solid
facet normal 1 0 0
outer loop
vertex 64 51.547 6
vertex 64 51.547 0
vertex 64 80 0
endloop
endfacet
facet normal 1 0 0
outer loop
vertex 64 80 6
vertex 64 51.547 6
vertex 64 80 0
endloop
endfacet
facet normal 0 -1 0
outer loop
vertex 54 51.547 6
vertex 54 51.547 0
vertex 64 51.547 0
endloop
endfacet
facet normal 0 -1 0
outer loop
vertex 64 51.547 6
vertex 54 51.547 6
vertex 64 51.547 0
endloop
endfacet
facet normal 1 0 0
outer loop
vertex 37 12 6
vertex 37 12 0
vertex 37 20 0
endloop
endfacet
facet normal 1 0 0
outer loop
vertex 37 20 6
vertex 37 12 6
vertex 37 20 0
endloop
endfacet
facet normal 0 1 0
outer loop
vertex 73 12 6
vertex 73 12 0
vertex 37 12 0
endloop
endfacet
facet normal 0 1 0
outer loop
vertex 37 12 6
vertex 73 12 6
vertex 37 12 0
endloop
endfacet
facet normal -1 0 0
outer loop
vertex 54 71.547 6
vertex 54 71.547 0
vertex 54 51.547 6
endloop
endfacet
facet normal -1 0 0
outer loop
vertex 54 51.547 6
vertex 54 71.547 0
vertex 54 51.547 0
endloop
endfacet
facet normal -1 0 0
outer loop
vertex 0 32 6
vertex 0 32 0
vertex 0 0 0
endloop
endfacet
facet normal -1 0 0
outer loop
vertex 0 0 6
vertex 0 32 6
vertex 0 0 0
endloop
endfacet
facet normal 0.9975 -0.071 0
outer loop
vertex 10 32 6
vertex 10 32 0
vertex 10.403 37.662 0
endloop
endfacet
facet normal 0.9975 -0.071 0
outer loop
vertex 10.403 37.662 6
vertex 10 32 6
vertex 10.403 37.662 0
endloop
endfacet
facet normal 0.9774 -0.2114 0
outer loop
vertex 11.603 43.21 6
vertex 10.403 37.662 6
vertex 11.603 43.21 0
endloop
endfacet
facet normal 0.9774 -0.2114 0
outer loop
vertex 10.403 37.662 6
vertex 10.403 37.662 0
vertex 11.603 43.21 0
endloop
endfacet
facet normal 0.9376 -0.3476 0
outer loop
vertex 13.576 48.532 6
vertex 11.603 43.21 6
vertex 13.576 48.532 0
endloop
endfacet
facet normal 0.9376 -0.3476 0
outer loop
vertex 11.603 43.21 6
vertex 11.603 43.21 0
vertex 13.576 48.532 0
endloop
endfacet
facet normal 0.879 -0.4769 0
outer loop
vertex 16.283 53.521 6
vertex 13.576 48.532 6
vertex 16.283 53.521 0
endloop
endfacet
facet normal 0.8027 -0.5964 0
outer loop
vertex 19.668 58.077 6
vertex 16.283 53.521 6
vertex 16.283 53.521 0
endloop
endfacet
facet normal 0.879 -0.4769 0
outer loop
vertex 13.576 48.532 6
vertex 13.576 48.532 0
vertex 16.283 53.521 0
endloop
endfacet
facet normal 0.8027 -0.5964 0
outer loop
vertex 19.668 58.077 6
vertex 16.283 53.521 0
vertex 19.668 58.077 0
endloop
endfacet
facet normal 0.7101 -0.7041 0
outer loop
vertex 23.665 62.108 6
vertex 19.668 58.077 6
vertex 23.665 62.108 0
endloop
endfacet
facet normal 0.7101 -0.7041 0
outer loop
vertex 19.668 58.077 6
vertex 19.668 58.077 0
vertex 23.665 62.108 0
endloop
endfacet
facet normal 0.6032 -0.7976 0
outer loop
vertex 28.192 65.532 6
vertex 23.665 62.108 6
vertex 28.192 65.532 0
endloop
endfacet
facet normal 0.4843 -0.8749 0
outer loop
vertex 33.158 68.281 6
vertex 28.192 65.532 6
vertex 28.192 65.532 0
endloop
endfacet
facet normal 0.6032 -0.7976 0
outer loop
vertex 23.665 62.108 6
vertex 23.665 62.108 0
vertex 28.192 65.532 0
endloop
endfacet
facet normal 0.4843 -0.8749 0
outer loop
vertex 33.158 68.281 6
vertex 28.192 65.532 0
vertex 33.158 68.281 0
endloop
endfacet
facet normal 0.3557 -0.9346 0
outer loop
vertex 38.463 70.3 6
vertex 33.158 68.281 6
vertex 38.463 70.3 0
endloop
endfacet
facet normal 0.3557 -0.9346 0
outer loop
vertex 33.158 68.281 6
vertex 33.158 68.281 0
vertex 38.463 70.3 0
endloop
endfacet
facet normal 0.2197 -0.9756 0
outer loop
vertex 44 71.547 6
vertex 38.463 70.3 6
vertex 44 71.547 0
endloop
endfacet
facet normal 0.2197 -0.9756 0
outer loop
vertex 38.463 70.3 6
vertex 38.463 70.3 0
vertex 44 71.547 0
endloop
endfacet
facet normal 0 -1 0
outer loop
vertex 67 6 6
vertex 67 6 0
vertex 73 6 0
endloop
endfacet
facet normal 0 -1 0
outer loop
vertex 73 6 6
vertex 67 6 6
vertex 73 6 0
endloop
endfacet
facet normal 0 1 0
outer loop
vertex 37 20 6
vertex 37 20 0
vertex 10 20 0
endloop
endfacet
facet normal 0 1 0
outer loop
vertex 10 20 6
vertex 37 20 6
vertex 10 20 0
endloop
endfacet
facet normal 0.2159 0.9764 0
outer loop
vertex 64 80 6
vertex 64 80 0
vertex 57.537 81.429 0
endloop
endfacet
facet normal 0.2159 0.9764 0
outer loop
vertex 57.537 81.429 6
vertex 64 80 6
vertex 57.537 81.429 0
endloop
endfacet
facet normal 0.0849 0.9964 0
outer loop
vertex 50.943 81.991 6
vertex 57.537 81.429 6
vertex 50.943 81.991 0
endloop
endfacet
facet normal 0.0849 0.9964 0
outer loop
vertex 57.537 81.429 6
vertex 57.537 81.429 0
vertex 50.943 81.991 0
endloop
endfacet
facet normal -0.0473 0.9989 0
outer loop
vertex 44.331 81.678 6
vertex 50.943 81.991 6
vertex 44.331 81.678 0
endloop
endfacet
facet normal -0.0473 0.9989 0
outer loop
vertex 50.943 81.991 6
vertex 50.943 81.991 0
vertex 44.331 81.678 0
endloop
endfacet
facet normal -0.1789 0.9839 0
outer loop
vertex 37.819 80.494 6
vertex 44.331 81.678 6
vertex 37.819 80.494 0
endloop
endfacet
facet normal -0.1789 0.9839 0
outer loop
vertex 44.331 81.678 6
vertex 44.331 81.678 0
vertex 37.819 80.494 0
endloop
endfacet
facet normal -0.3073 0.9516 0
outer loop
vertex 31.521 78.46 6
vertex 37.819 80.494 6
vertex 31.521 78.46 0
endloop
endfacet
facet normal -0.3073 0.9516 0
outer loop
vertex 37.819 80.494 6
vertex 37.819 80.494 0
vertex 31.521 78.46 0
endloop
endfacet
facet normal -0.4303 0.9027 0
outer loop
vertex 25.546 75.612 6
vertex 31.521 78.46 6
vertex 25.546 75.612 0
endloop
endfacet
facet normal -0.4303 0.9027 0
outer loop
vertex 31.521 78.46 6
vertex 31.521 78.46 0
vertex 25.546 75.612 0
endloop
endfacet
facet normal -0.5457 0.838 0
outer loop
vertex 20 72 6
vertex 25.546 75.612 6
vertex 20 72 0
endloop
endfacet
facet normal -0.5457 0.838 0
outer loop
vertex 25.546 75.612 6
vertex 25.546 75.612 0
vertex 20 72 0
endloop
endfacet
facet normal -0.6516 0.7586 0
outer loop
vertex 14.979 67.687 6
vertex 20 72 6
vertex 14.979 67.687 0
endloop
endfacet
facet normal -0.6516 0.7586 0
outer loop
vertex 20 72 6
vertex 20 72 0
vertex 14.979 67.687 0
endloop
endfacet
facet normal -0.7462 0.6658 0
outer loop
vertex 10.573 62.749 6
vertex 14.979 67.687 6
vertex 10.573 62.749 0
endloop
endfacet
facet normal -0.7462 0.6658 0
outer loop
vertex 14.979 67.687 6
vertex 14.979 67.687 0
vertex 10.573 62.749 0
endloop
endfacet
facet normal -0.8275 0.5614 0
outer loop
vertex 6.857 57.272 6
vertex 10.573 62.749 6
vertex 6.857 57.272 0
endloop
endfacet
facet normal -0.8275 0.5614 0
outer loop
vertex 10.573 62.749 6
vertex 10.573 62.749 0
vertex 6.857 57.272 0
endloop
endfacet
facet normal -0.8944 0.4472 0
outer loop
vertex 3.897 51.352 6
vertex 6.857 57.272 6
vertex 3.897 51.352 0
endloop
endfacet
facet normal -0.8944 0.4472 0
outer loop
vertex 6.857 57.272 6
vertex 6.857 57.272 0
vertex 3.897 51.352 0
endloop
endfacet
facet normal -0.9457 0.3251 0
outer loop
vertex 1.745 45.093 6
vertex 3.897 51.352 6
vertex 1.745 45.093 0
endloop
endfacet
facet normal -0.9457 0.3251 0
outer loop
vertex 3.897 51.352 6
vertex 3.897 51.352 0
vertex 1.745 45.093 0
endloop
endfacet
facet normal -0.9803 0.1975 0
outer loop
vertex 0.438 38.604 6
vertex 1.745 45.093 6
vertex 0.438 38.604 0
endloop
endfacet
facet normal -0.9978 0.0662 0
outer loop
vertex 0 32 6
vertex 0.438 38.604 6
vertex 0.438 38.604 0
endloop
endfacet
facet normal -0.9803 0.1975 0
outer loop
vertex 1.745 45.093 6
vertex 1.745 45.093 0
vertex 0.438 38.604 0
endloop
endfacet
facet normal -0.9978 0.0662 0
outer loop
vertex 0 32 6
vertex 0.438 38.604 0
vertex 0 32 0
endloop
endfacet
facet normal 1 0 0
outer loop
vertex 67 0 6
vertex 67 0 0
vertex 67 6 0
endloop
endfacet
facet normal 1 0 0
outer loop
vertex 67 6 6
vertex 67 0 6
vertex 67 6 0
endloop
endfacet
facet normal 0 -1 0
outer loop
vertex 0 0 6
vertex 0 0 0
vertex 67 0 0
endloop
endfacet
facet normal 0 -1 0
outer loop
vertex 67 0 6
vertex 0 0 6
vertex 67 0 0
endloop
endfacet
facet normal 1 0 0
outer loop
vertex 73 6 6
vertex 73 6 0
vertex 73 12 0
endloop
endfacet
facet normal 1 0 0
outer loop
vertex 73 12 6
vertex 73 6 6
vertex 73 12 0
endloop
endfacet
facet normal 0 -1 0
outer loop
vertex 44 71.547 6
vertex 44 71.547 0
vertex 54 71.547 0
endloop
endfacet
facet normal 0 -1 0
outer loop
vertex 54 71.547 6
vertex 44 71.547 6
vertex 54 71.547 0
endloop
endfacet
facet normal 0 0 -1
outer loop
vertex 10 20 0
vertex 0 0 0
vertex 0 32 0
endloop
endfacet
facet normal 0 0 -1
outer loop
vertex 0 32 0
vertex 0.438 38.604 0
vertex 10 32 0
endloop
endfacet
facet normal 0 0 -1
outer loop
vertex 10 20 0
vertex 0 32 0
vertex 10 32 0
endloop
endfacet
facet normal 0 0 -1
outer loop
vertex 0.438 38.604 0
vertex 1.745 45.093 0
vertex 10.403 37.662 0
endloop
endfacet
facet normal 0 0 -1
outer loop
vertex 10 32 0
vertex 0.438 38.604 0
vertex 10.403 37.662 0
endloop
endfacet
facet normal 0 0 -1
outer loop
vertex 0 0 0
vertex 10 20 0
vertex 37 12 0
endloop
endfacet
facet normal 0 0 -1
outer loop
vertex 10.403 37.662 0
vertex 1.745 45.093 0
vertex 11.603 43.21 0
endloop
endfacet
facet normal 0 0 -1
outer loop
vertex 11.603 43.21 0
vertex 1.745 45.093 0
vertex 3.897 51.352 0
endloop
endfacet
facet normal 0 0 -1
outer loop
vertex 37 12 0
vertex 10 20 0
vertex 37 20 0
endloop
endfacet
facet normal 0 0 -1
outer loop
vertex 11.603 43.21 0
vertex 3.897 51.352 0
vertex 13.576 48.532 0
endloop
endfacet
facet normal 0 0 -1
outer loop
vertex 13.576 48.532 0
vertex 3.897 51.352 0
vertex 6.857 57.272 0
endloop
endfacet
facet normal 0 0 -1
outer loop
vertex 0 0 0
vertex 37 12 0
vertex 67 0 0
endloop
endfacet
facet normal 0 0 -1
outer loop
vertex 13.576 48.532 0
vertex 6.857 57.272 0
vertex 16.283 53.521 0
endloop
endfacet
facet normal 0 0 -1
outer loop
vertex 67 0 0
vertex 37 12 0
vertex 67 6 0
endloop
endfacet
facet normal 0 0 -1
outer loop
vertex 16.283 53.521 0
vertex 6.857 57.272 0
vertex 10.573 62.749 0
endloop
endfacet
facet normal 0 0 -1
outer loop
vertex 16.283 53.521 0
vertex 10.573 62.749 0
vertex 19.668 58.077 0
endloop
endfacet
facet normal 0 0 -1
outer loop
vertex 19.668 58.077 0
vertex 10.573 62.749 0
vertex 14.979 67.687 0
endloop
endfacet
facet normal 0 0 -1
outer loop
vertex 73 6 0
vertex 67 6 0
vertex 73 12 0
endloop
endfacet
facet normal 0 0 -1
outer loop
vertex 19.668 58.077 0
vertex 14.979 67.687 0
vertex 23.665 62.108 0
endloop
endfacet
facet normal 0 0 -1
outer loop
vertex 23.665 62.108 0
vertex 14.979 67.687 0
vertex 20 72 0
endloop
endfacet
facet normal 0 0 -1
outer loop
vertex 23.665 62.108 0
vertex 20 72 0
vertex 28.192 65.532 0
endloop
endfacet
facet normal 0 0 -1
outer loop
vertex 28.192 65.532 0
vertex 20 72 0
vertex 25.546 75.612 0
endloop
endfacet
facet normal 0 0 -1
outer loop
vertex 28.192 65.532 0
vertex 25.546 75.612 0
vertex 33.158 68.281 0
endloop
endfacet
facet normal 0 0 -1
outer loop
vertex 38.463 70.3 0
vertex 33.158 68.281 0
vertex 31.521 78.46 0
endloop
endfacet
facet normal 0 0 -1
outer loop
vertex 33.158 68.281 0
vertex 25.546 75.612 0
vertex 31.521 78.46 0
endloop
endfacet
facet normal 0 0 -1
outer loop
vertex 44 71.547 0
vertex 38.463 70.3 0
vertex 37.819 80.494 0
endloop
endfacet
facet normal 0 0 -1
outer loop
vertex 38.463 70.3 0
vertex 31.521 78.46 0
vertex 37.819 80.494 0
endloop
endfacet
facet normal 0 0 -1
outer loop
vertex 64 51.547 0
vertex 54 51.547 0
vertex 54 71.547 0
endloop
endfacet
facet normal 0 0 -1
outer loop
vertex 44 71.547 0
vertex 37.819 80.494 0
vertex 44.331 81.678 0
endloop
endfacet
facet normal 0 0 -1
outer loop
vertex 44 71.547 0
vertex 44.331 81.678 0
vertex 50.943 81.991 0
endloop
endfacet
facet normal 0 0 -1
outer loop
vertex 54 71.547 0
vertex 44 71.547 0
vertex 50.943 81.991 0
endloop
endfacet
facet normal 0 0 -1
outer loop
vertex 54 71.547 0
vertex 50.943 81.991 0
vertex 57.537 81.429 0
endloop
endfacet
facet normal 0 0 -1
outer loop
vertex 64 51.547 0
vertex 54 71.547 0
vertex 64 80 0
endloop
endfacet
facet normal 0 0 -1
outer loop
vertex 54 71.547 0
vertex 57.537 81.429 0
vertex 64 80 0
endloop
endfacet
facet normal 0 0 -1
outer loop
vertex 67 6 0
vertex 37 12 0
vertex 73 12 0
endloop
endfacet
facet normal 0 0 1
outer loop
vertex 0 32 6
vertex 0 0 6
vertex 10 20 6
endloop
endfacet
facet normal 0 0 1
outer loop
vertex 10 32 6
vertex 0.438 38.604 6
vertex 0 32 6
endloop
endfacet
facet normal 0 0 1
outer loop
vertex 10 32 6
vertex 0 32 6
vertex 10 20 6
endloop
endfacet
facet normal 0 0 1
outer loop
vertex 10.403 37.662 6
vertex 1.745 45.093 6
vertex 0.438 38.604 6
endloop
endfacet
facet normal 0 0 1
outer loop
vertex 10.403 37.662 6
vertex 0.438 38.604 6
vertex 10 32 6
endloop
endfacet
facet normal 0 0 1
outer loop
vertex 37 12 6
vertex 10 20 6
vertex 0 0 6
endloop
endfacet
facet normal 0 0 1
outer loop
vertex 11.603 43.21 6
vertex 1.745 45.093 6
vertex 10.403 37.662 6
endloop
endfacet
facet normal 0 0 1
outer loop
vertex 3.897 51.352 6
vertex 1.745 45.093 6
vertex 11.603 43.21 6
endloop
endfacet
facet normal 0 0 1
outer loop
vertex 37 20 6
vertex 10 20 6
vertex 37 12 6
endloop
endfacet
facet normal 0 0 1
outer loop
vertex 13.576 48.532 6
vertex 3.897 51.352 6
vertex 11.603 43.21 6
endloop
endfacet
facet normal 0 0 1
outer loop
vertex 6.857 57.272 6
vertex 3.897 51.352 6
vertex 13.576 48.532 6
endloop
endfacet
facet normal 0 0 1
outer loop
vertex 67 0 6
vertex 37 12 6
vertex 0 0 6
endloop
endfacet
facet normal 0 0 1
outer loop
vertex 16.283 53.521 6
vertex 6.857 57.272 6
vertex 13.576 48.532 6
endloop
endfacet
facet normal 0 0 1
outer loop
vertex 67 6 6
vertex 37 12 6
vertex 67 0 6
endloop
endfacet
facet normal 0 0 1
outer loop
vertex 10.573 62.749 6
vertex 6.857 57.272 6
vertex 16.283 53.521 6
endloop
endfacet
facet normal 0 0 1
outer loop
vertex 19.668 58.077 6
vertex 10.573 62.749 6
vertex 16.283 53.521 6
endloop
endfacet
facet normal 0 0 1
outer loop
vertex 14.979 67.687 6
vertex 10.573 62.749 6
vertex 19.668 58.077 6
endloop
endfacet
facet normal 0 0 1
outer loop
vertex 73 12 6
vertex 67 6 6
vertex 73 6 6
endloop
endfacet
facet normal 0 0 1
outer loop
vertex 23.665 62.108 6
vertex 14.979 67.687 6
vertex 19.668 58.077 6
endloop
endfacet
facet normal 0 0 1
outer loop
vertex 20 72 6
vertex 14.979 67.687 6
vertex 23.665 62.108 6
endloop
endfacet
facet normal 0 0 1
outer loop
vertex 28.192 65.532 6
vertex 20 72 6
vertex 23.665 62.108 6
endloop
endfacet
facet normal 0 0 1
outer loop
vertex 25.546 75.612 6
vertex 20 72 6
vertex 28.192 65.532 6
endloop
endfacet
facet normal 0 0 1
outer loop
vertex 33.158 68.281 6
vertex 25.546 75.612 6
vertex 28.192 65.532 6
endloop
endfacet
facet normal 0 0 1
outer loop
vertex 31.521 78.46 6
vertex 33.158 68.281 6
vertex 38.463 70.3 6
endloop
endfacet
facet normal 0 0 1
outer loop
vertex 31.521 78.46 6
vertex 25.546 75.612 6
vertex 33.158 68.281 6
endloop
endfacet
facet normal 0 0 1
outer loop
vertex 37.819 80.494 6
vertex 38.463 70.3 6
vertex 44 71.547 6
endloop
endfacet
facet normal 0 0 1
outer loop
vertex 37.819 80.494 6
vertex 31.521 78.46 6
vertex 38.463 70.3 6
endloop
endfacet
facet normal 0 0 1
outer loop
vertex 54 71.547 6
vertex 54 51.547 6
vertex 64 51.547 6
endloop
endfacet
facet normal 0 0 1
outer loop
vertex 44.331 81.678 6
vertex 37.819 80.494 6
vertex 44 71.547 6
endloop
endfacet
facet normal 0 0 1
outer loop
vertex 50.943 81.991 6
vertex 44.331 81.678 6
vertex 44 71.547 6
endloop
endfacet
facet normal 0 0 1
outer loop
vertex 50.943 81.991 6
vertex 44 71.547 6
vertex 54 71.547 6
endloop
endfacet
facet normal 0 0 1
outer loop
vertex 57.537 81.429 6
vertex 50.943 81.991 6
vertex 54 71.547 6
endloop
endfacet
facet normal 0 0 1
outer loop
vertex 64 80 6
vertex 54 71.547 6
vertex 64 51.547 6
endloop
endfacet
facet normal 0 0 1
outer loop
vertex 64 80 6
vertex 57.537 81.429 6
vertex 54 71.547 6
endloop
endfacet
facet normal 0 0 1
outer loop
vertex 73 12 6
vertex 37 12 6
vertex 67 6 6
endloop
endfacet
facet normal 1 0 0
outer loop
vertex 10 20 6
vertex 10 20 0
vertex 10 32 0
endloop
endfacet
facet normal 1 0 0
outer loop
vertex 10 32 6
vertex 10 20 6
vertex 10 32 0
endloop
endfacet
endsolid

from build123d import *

# Parameters (mm, degrees)
EXTRUDE_1_DEPTH = 6


with BuildPart() as part:
    # Эскиз2 → Бобышка-Вытянуть1 (new body)
    with BuildSketch(Plane.XY):
        with BuildLine():
            Line((10, 20), (10, 32))
            ThreePointArc((10, 32), (19.668498224, 58.076809621), (44, 71.547439867))
            Line((44, 71.547439867), (54, 71.547439867))
            Line((54, 71.547439867), (54, 51.547439867))
            Line((54, 51.547439867), (64, 51.547439867))
            Line((64, 51.547439867), (64, 80))
            ThreePointArc((64, 80), (20, 72), (0, 32))
            Line((0, 32), (0, 0))
            Line((0, 0), (67, 0))
            Line((67, 0), (67, 6))
            Line((67, 6), (73, 6))
            Line((73, 6), (73, 12))
            Line((73, 12), (67, 12))
            Line((67, 12), (37, 12))
            Line((37, 12), (37, 20))
            Line((37, 20), (10, 20))
        make_face()
    extrude(amount=EXTRUDE_1_DEPTH)


solid = part.part
